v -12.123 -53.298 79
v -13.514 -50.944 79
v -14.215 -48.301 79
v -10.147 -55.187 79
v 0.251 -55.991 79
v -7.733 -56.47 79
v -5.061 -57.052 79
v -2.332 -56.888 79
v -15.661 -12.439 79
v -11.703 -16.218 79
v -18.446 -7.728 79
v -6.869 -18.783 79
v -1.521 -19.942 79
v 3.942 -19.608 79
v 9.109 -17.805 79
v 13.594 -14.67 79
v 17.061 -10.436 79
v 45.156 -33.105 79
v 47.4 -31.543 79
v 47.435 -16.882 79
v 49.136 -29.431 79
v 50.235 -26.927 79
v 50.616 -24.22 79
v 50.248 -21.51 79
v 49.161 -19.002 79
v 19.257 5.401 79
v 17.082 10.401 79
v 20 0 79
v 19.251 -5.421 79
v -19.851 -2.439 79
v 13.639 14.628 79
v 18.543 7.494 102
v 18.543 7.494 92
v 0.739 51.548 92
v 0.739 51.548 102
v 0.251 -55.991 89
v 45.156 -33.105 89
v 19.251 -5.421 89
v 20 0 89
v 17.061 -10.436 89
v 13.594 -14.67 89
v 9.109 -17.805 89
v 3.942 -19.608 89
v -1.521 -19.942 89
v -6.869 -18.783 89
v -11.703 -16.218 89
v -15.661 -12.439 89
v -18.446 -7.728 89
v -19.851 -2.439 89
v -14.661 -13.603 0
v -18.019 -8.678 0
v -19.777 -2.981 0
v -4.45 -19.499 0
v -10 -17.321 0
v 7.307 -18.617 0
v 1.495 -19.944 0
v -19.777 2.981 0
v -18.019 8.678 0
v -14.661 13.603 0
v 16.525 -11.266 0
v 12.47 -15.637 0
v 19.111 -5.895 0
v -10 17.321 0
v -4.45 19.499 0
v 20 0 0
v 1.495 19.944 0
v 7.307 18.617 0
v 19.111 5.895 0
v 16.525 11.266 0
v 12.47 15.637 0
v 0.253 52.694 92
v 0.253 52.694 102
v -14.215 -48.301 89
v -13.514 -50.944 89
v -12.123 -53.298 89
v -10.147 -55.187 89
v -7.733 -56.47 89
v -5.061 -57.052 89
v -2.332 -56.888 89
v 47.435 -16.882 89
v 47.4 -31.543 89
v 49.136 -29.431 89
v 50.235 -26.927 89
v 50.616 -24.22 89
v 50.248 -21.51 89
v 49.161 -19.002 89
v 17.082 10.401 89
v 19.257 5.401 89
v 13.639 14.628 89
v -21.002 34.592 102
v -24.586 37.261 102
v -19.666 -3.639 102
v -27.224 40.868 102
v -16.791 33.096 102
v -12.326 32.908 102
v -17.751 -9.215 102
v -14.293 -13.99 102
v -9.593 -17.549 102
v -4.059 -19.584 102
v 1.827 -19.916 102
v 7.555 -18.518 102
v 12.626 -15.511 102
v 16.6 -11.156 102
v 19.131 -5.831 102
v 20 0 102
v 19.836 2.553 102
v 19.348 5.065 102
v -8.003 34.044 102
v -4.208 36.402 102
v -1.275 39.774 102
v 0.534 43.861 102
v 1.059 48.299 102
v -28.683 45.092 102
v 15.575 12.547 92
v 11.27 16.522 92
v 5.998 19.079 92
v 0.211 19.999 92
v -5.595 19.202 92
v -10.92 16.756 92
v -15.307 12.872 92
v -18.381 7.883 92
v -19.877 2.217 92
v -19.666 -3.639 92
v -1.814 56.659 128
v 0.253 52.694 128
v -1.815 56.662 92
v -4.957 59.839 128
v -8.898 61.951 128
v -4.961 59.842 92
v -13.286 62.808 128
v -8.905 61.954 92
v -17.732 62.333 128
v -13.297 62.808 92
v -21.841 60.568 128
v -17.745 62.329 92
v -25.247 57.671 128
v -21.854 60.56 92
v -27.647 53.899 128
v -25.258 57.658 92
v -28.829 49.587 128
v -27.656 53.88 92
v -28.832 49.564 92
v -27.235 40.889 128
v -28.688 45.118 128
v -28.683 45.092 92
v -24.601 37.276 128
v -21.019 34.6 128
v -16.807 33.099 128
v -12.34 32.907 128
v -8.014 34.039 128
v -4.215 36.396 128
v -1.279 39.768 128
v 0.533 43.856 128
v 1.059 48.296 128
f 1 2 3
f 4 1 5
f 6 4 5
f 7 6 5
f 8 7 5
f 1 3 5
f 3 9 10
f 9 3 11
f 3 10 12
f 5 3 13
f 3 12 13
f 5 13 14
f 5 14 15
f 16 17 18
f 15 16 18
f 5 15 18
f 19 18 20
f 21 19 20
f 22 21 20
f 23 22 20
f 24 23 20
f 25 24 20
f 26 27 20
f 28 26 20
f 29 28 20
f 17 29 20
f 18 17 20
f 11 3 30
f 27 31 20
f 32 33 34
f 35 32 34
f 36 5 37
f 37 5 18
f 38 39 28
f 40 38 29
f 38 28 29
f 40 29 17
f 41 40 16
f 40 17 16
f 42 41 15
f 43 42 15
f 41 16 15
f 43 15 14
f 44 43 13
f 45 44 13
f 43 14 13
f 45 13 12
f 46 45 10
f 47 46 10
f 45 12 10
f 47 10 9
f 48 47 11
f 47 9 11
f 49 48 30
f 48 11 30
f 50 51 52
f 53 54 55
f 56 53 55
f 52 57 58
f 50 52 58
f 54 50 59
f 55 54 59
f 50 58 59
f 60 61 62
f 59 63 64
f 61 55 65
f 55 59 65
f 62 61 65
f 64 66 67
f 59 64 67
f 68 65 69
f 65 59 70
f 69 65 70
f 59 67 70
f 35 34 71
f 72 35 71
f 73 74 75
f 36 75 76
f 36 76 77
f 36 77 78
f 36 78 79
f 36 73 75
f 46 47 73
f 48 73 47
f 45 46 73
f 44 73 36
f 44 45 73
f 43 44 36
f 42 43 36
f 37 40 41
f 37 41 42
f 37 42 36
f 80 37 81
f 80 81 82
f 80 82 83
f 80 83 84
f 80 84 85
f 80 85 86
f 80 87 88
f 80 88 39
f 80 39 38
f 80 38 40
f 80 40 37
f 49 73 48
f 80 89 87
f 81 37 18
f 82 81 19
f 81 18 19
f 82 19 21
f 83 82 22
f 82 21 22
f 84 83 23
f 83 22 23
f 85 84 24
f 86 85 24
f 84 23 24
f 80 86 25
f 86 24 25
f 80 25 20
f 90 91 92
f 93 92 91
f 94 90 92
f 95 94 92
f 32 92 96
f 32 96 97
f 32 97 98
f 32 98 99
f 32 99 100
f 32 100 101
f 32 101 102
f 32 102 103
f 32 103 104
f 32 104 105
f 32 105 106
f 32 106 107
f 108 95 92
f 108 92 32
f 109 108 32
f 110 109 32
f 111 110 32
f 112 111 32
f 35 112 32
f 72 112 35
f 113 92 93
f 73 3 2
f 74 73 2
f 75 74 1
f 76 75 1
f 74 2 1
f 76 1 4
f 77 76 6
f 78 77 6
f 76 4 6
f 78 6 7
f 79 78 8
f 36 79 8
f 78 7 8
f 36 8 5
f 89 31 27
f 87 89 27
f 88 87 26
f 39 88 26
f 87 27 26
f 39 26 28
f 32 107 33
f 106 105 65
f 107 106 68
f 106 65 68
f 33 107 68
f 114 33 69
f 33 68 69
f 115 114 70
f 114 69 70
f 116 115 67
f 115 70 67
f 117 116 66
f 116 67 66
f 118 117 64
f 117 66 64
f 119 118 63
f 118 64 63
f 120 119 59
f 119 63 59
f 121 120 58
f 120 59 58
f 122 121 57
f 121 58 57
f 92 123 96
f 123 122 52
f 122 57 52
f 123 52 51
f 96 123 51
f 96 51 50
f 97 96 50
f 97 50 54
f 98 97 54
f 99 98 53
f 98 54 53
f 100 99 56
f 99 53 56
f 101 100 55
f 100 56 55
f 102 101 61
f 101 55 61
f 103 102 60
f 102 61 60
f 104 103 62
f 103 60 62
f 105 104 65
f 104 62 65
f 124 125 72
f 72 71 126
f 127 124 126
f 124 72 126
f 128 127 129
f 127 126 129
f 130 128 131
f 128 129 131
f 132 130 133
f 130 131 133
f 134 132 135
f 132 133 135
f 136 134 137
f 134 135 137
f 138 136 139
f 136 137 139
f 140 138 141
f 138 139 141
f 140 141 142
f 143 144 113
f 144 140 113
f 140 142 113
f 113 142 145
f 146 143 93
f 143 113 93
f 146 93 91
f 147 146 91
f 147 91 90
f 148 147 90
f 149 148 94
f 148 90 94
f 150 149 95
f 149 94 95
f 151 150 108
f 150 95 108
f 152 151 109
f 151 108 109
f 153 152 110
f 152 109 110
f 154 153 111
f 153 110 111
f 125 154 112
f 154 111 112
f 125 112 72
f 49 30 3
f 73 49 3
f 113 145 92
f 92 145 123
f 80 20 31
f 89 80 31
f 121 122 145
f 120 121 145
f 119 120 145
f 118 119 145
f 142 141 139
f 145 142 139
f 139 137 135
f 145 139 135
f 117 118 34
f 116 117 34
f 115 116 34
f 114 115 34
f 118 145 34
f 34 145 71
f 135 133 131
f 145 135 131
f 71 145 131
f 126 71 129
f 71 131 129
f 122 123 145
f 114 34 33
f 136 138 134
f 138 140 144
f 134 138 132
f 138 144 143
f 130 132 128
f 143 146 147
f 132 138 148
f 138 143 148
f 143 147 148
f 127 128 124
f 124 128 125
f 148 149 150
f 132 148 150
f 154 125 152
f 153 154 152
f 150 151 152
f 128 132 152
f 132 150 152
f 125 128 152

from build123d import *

# Parameters (mm, degrees)
SKETCH1_R           = 20
BOSS_EXTRUDE1_DEPTH = 102
BOSS_EXTRUDE2_START = -10
BOSS_EXTRUDE2_DEPTH = 10
BOSS_EXTRUDE3_START = -10
SKETCH3_R           = 20
BOSS_EXTRUDE3_DEPTH = 10
SKETCH4_R           = 15
BOSS_EXTRUDE4_DEPTH = 36


with BuildPart() as part:
    # Sketch1 → Boss-Extrude1 (new body)
    with BuildSketch(Plane.XY):
        Circle(SKETCH1_R)
    extrude(amount=BOSS_EXTRUDE1_DEPTH)

    # Sketch3 → Boss-Extrude3 (add)
    with BuildSketch(Plane.XY.offset(102).offset(BOSS_EXTRUDE3_START)):
        with BuildLine():
            ThreePointArc((-19.666174765, -3.638896824), (-5.594629402, 19.20156561), (18.542984562, 7.49384571))
            Line((18.542984562, 7.49384571), (0.739309321, 51.54776514))
            Line((0.739309321, 51.54776514), (0.253016385, 52.694397104))
            ThreePointArc((0.253016385, 52.694397104), (-17.744840944, 62.329365212), (-28.683102916, 45.092488931))
            Line((-28.683102916, 45.092488931), (-19.666174765, -3.638896824))
        make_face()
        with Locations(Location((0, 0, 0), (0, 0, 190.483061842))):
            Circle(SKETCH3_R)
    extrude(amount=BOSS_EXTRUDE3_DEPTH)

    # Sketch4 → Boss-Extrude4 (add)
    with BuildSketch(Plane(origin=(0, 0, 92), x_dir=(-1, 0, 0), z_dir=(0, 0, -1))):
        with Locations(Location((13.933471842, 47.821661549, 0), (0, 0, 161.043570809))):
            Circle(SKETCH4_R)
    extrude(amount=-BOSS_EXTRUDE4_DEPTH)


with BuildPart() as body_2:
    # Sketch2 → Boss-Extrude2 (new body)
    with BuildSketch(Plane.XY.offset(89).offset(BOSS_EXTRUDE2_START)):
        with BuildLine():
            Line((-19.850697676, -2.439221552), (-14.21526494, -48.301095563))
            ThreePointArc((-14.21526494, -48.301095563), (-8.983815658, -55.911394581), (0.250812376, -55.991130397))
            Line((0.250812376, -55.991130397), (45.15647241, -33.105325697))
            ThreePointArc((45.15647241, -33.105325697), (50.518553205, -25.586495849), (47.435051559, -16.881512775))
            Line((47.435051559, -16.881512775), (13.638615256, 14.628334625))
            ThreePointArc((13.638615256, 14.628334625), (18.34083293, 7.97582895), (20, 0))
            ThreePointArc((20, 0), (1.221893302, -19.962639524), (-19.850697676, -2.439221552))
        make_face()
    extrude(amount=BOSS_EXTRUDE2_DEPTH)


solid = Compound([part.part, body_2.part])
